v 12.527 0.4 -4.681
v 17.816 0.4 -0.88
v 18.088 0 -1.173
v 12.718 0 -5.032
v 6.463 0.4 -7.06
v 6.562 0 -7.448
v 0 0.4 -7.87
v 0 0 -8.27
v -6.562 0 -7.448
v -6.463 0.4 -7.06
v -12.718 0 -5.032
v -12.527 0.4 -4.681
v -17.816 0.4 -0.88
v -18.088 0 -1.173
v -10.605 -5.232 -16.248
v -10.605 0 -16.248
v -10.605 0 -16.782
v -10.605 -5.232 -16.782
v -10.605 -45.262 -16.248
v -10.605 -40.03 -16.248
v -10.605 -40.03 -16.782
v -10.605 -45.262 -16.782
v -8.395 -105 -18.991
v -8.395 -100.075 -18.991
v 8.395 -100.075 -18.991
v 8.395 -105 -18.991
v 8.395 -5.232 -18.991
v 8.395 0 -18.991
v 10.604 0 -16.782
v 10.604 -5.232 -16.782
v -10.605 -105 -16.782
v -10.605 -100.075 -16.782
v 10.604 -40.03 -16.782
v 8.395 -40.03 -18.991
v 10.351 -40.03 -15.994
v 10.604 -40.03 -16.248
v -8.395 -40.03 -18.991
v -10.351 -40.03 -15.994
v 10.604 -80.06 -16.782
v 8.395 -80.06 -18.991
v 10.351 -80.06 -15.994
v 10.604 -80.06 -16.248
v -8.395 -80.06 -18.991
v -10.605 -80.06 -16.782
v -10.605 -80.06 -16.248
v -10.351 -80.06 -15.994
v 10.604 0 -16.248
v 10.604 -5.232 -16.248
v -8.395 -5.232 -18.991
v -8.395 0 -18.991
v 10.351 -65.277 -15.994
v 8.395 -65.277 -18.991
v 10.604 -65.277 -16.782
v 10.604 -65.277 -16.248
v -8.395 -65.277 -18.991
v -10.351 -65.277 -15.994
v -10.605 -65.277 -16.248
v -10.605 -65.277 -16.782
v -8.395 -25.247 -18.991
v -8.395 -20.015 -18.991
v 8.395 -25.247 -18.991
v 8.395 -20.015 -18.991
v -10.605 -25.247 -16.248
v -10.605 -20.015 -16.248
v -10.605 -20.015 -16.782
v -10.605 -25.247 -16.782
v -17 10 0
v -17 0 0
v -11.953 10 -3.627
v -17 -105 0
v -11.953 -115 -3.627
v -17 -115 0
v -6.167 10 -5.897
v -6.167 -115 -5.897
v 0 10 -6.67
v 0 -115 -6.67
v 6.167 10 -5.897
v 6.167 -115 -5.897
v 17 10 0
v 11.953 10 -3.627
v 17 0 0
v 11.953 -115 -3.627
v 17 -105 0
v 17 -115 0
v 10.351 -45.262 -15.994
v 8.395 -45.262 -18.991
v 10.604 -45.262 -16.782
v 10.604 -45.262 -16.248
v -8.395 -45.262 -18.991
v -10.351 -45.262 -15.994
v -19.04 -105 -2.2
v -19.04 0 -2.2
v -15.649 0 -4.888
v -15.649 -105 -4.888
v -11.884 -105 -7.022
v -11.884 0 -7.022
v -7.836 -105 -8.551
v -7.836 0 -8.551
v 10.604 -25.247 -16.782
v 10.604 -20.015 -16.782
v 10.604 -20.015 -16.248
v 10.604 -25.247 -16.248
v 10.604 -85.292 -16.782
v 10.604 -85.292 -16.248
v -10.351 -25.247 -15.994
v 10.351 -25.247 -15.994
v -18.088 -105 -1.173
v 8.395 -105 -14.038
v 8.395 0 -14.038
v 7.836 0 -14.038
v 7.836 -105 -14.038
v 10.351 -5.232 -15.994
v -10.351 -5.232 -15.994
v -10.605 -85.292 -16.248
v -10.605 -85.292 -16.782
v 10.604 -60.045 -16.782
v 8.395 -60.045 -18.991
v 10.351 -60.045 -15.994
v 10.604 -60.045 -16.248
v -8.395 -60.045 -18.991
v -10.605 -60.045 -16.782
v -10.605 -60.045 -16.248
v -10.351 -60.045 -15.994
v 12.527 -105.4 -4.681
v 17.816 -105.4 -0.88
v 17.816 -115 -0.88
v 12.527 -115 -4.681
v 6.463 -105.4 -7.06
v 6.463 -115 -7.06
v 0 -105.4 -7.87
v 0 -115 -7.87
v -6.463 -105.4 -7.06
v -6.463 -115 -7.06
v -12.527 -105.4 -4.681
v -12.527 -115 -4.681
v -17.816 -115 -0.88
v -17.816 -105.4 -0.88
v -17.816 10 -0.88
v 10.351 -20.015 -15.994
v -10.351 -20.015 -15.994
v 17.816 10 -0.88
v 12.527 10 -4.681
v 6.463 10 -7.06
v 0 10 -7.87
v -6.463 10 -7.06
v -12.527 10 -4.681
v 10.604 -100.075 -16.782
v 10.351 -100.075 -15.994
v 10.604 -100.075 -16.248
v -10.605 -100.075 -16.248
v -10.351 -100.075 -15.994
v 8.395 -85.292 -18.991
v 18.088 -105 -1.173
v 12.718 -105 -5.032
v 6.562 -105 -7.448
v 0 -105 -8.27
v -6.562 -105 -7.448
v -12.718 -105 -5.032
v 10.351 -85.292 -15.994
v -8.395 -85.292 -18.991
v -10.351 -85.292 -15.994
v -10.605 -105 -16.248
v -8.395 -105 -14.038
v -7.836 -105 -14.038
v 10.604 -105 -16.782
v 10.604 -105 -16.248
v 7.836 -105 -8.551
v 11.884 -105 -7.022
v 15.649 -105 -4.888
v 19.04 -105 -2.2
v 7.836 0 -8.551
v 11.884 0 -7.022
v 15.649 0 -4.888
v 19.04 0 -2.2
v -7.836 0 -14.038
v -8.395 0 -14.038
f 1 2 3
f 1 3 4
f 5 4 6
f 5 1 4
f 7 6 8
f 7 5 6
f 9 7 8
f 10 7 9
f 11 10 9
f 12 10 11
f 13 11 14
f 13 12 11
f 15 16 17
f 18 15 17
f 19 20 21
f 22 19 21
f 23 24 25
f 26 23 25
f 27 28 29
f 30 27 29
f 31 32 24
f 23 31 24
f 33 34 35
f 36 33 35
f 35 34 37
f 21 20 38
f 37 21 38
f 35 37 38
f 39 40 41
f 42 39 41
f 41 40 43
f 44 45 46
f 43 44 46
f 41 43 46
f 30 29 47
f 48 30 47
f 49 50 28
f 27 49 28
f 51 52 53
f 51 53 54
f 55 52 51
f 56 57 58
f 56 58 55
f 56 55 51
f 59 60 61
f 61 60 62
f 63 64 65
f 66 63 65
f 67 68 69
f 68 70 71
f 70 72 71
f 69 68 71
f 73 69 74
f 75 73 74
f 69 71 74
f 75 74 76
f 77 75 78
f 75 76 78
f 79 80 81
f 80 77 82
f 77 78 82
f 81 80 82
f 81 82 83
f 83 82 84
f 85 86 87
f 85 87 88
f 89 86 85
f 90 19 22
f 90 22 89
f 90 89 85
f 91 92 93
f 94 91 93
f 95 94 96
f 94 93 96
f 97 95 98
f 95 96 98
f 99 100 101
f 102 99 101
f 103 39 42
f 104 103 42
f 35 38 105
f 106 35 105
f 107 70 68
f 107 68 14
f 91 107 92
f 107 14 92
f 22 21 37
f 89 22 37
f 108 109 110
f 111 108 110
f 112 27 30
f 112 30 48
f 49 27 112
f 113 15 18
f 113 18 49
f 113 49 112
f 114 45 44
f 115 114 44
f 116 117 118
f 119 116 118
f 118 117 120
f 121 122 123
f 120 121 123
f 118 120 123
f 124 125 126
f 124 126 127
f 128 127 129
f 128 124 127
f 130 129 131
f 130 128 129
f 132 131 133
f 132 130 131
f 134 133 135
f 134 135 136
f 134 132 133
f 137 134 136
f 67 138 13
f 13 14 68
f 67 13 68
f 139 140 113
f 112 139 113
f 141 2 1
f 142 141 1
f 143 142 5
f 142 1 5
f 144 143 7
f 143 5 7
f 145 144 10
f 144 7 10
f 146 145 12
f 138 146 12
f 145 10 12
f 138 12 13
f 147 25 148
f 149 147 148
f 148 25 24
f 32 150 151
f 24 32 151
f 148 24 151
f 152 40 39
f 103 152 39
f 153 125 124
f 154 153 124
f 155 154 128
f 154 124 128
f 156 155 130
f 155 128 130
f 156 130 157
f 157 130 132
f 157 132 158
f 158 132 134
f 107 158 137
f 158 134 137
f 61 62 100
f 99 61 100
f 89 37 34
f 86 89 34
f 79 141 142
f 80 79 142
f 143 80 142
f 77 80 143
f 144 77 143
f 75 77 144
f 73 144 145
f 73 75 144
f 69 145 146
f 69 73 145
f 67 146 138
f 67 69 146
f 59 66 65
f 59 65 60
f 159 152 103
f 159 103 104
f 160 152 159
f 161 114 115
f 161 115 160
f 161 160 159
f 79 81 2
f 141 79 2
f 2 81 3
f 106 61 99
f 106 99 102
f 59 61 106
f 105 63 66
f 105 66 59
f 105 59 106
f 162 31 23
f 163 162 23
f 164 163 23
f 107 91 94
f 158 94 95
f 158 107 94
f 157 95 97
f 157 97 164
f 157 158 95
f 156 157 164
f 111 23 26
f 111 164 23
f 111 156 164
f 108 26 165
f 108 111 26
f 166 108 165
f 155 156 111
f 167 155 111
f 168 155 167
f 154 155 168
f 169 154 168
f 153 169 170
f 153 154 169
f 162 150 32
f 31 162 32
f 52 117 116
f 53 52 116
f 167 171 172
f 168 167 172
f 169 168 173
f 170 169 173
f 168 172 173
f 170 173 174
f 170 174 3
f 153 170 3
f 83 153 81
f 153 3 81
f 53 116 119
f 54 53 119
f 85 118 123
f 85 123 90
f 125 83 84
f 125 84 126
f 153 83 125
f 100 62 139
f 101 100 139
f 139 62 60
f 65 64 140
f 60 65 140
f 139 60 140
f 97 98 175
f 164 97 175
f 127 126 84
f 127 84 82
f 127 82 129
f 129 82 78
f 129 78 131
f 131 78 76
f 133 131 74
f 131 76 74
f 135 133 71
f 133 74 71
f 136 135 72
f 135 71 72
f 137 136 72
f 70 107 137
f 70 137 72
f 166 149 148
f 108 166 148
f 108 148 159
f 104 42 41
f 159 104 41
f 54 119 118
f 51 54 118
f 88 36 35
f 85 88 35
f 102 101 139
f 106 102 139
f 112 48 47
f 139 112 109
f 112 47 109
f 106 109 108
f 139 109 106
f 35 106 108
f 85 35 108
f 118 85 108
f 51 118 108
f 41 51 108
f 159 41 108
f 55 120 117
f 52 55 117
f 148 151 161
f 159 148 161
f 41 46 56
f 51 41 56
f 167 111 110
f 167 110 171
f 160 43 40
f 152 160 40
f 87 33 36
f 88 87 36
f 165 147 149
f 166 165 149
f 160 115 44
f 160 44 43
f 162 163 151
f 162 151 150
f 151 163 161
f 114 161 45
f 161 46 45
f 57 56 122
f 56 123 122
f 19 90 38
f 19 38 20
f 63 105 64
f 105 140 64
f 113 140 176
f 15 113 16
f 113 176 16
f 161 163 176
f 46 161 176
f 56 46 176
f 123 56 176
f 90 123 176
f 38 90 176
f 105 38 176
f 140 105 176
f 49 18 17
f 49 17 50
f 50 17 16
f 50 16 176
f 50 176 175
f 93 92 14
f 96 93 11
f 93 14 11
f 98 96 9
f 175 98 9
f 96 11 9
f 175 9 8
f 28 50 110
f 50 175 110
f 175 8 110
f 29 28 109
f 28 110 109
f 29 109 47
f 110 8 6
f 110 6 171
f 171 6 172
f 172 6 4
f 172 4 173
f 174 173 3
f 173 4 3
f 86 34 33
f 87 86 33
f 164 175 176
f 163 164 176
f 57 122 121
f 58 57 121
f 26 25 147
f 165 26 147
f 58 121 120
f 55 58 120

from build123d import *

# Parameters (mm, degrees)
F1_DEPTH      = 105
F3_DEPTH      = 10
F3_DEPTH_BACK = 115
F4_W          = 14.7828
F4_H          = 2.9972
F5_DEPTH      = 12.5
F6_SIZE       = 0.4


with BuildPart() as f1:
    # F0 (on Front) → F1 (new body)
    with BuildSketch(Plane.XZ):
        with BuildLine():
            ThreePointArc((17, 0), (0, -6.6696972202), (-17, 0))
            Line((-17, 0), (-19.04, -2.1996363336))
            ThreePointArc((-19.04, -2.1996363336), (-13.8080814962, -6.0282046743), (-7.8359, -8.5508927142))
            ThreePointArc((-7.8359, -8.5508927142), (0, -9.6696972202), (7.8359, -8.5508927142))
            ThreePointArc((7.8359, -8.5508927142), (13.8080814962, -6.0282046743), (19.04, -2.1996363336))
            Line((19.04, -2.1996363336), (17, 0))
        make_face()
        with BuildLine():
            ThreePointArc((7.8359, -8.5508927142), (0, -9.6696972202), (-7.8359, -8.5508927142))
            Line((-7.8359, -8.5508927142), (-7.8359, -14.0384971209))
            Line((-7.8359, -14.0384971209), (7.8359, -14.0384971209))
            Line((7.8359, -14.0384971209), (7.8359, -8.5508927142))
        make_face()
        Polygon((7.8359, -14.0384971209), (-7.8359, -14.0384971209), (-8.3947000496, -14.0384971209), (-10.6045000496, -16.2482972202), (-10.6045000496, -16.7816972202), (-8.3946999504, -18.9914972202), (8.3946999504, -18.9914972202), (10.6044999504, -16.7816971209), (10.6044999504, -16.2482971209), (8.3946998511, -14.0384971209), align=None)
    extrude(amount=F1_DEPTH)

    # F2 (on face) → F3 (join, two sides)
    with BuildSketch(Plane(origin=(0, 0, 0), x_dir=(-1, 0, 0), z_dir=(0, 1, 0))) as f3_sk:
        with BuildLine():
            Line((17.816, -0.8798545334), (17, 0))
            ThreePointArc((17, 0), (0, -6.6696972202), (-17, 0))
            Line((-17, 0), (-17.816, -0.8798545334))
            ThreePointArc((-17.816, -0.8798545334), (0, -7.8696972202), (17.816, -0.8798545334))
        make_face()
    extrude(amount=F3_DEPTH)
    extrude(f3_sk.sketch, amount=-F3_DEPTH_BACK)

    # F4 (on Right) → F5 (cut, symmetric)
    with BuildSketch(Plane.YZ):
        with Locations((-12.6238, -17.4928972202)):
            Rectangle(F4_W, F4_H)
        with Locations((-32.6388, -17.4928972202)):
            Rectangle(F4_W, F4_H)
        with Locations((-52.6538, -17.4928972202)):
            Rectangle(F4_W, F4_H)
        with Locations((-72.6688, -17.4928972202)):
            Rectangle(F4_W, F4_H)
        with Locations((-92.6838, -17.4928972202)):
            Rectangle(F4_W, F4_H)
        with Locations((-112.6988, -17.4928972202)):
            Rectangle(F4_W, F4_H)
    extrude(amount=F5_DEPTH, both=True, mode=Mode.SUBTRACT)

    # F6
    f6_edges = [f1.edges().sort_by_distance(p)[0] for p in [
        (0, 0, -7.869697),
        (0, -105, -7.869697),
    ]]
    chamfer(f6_edges, length=F6_SIZE)


solid = f1.part
